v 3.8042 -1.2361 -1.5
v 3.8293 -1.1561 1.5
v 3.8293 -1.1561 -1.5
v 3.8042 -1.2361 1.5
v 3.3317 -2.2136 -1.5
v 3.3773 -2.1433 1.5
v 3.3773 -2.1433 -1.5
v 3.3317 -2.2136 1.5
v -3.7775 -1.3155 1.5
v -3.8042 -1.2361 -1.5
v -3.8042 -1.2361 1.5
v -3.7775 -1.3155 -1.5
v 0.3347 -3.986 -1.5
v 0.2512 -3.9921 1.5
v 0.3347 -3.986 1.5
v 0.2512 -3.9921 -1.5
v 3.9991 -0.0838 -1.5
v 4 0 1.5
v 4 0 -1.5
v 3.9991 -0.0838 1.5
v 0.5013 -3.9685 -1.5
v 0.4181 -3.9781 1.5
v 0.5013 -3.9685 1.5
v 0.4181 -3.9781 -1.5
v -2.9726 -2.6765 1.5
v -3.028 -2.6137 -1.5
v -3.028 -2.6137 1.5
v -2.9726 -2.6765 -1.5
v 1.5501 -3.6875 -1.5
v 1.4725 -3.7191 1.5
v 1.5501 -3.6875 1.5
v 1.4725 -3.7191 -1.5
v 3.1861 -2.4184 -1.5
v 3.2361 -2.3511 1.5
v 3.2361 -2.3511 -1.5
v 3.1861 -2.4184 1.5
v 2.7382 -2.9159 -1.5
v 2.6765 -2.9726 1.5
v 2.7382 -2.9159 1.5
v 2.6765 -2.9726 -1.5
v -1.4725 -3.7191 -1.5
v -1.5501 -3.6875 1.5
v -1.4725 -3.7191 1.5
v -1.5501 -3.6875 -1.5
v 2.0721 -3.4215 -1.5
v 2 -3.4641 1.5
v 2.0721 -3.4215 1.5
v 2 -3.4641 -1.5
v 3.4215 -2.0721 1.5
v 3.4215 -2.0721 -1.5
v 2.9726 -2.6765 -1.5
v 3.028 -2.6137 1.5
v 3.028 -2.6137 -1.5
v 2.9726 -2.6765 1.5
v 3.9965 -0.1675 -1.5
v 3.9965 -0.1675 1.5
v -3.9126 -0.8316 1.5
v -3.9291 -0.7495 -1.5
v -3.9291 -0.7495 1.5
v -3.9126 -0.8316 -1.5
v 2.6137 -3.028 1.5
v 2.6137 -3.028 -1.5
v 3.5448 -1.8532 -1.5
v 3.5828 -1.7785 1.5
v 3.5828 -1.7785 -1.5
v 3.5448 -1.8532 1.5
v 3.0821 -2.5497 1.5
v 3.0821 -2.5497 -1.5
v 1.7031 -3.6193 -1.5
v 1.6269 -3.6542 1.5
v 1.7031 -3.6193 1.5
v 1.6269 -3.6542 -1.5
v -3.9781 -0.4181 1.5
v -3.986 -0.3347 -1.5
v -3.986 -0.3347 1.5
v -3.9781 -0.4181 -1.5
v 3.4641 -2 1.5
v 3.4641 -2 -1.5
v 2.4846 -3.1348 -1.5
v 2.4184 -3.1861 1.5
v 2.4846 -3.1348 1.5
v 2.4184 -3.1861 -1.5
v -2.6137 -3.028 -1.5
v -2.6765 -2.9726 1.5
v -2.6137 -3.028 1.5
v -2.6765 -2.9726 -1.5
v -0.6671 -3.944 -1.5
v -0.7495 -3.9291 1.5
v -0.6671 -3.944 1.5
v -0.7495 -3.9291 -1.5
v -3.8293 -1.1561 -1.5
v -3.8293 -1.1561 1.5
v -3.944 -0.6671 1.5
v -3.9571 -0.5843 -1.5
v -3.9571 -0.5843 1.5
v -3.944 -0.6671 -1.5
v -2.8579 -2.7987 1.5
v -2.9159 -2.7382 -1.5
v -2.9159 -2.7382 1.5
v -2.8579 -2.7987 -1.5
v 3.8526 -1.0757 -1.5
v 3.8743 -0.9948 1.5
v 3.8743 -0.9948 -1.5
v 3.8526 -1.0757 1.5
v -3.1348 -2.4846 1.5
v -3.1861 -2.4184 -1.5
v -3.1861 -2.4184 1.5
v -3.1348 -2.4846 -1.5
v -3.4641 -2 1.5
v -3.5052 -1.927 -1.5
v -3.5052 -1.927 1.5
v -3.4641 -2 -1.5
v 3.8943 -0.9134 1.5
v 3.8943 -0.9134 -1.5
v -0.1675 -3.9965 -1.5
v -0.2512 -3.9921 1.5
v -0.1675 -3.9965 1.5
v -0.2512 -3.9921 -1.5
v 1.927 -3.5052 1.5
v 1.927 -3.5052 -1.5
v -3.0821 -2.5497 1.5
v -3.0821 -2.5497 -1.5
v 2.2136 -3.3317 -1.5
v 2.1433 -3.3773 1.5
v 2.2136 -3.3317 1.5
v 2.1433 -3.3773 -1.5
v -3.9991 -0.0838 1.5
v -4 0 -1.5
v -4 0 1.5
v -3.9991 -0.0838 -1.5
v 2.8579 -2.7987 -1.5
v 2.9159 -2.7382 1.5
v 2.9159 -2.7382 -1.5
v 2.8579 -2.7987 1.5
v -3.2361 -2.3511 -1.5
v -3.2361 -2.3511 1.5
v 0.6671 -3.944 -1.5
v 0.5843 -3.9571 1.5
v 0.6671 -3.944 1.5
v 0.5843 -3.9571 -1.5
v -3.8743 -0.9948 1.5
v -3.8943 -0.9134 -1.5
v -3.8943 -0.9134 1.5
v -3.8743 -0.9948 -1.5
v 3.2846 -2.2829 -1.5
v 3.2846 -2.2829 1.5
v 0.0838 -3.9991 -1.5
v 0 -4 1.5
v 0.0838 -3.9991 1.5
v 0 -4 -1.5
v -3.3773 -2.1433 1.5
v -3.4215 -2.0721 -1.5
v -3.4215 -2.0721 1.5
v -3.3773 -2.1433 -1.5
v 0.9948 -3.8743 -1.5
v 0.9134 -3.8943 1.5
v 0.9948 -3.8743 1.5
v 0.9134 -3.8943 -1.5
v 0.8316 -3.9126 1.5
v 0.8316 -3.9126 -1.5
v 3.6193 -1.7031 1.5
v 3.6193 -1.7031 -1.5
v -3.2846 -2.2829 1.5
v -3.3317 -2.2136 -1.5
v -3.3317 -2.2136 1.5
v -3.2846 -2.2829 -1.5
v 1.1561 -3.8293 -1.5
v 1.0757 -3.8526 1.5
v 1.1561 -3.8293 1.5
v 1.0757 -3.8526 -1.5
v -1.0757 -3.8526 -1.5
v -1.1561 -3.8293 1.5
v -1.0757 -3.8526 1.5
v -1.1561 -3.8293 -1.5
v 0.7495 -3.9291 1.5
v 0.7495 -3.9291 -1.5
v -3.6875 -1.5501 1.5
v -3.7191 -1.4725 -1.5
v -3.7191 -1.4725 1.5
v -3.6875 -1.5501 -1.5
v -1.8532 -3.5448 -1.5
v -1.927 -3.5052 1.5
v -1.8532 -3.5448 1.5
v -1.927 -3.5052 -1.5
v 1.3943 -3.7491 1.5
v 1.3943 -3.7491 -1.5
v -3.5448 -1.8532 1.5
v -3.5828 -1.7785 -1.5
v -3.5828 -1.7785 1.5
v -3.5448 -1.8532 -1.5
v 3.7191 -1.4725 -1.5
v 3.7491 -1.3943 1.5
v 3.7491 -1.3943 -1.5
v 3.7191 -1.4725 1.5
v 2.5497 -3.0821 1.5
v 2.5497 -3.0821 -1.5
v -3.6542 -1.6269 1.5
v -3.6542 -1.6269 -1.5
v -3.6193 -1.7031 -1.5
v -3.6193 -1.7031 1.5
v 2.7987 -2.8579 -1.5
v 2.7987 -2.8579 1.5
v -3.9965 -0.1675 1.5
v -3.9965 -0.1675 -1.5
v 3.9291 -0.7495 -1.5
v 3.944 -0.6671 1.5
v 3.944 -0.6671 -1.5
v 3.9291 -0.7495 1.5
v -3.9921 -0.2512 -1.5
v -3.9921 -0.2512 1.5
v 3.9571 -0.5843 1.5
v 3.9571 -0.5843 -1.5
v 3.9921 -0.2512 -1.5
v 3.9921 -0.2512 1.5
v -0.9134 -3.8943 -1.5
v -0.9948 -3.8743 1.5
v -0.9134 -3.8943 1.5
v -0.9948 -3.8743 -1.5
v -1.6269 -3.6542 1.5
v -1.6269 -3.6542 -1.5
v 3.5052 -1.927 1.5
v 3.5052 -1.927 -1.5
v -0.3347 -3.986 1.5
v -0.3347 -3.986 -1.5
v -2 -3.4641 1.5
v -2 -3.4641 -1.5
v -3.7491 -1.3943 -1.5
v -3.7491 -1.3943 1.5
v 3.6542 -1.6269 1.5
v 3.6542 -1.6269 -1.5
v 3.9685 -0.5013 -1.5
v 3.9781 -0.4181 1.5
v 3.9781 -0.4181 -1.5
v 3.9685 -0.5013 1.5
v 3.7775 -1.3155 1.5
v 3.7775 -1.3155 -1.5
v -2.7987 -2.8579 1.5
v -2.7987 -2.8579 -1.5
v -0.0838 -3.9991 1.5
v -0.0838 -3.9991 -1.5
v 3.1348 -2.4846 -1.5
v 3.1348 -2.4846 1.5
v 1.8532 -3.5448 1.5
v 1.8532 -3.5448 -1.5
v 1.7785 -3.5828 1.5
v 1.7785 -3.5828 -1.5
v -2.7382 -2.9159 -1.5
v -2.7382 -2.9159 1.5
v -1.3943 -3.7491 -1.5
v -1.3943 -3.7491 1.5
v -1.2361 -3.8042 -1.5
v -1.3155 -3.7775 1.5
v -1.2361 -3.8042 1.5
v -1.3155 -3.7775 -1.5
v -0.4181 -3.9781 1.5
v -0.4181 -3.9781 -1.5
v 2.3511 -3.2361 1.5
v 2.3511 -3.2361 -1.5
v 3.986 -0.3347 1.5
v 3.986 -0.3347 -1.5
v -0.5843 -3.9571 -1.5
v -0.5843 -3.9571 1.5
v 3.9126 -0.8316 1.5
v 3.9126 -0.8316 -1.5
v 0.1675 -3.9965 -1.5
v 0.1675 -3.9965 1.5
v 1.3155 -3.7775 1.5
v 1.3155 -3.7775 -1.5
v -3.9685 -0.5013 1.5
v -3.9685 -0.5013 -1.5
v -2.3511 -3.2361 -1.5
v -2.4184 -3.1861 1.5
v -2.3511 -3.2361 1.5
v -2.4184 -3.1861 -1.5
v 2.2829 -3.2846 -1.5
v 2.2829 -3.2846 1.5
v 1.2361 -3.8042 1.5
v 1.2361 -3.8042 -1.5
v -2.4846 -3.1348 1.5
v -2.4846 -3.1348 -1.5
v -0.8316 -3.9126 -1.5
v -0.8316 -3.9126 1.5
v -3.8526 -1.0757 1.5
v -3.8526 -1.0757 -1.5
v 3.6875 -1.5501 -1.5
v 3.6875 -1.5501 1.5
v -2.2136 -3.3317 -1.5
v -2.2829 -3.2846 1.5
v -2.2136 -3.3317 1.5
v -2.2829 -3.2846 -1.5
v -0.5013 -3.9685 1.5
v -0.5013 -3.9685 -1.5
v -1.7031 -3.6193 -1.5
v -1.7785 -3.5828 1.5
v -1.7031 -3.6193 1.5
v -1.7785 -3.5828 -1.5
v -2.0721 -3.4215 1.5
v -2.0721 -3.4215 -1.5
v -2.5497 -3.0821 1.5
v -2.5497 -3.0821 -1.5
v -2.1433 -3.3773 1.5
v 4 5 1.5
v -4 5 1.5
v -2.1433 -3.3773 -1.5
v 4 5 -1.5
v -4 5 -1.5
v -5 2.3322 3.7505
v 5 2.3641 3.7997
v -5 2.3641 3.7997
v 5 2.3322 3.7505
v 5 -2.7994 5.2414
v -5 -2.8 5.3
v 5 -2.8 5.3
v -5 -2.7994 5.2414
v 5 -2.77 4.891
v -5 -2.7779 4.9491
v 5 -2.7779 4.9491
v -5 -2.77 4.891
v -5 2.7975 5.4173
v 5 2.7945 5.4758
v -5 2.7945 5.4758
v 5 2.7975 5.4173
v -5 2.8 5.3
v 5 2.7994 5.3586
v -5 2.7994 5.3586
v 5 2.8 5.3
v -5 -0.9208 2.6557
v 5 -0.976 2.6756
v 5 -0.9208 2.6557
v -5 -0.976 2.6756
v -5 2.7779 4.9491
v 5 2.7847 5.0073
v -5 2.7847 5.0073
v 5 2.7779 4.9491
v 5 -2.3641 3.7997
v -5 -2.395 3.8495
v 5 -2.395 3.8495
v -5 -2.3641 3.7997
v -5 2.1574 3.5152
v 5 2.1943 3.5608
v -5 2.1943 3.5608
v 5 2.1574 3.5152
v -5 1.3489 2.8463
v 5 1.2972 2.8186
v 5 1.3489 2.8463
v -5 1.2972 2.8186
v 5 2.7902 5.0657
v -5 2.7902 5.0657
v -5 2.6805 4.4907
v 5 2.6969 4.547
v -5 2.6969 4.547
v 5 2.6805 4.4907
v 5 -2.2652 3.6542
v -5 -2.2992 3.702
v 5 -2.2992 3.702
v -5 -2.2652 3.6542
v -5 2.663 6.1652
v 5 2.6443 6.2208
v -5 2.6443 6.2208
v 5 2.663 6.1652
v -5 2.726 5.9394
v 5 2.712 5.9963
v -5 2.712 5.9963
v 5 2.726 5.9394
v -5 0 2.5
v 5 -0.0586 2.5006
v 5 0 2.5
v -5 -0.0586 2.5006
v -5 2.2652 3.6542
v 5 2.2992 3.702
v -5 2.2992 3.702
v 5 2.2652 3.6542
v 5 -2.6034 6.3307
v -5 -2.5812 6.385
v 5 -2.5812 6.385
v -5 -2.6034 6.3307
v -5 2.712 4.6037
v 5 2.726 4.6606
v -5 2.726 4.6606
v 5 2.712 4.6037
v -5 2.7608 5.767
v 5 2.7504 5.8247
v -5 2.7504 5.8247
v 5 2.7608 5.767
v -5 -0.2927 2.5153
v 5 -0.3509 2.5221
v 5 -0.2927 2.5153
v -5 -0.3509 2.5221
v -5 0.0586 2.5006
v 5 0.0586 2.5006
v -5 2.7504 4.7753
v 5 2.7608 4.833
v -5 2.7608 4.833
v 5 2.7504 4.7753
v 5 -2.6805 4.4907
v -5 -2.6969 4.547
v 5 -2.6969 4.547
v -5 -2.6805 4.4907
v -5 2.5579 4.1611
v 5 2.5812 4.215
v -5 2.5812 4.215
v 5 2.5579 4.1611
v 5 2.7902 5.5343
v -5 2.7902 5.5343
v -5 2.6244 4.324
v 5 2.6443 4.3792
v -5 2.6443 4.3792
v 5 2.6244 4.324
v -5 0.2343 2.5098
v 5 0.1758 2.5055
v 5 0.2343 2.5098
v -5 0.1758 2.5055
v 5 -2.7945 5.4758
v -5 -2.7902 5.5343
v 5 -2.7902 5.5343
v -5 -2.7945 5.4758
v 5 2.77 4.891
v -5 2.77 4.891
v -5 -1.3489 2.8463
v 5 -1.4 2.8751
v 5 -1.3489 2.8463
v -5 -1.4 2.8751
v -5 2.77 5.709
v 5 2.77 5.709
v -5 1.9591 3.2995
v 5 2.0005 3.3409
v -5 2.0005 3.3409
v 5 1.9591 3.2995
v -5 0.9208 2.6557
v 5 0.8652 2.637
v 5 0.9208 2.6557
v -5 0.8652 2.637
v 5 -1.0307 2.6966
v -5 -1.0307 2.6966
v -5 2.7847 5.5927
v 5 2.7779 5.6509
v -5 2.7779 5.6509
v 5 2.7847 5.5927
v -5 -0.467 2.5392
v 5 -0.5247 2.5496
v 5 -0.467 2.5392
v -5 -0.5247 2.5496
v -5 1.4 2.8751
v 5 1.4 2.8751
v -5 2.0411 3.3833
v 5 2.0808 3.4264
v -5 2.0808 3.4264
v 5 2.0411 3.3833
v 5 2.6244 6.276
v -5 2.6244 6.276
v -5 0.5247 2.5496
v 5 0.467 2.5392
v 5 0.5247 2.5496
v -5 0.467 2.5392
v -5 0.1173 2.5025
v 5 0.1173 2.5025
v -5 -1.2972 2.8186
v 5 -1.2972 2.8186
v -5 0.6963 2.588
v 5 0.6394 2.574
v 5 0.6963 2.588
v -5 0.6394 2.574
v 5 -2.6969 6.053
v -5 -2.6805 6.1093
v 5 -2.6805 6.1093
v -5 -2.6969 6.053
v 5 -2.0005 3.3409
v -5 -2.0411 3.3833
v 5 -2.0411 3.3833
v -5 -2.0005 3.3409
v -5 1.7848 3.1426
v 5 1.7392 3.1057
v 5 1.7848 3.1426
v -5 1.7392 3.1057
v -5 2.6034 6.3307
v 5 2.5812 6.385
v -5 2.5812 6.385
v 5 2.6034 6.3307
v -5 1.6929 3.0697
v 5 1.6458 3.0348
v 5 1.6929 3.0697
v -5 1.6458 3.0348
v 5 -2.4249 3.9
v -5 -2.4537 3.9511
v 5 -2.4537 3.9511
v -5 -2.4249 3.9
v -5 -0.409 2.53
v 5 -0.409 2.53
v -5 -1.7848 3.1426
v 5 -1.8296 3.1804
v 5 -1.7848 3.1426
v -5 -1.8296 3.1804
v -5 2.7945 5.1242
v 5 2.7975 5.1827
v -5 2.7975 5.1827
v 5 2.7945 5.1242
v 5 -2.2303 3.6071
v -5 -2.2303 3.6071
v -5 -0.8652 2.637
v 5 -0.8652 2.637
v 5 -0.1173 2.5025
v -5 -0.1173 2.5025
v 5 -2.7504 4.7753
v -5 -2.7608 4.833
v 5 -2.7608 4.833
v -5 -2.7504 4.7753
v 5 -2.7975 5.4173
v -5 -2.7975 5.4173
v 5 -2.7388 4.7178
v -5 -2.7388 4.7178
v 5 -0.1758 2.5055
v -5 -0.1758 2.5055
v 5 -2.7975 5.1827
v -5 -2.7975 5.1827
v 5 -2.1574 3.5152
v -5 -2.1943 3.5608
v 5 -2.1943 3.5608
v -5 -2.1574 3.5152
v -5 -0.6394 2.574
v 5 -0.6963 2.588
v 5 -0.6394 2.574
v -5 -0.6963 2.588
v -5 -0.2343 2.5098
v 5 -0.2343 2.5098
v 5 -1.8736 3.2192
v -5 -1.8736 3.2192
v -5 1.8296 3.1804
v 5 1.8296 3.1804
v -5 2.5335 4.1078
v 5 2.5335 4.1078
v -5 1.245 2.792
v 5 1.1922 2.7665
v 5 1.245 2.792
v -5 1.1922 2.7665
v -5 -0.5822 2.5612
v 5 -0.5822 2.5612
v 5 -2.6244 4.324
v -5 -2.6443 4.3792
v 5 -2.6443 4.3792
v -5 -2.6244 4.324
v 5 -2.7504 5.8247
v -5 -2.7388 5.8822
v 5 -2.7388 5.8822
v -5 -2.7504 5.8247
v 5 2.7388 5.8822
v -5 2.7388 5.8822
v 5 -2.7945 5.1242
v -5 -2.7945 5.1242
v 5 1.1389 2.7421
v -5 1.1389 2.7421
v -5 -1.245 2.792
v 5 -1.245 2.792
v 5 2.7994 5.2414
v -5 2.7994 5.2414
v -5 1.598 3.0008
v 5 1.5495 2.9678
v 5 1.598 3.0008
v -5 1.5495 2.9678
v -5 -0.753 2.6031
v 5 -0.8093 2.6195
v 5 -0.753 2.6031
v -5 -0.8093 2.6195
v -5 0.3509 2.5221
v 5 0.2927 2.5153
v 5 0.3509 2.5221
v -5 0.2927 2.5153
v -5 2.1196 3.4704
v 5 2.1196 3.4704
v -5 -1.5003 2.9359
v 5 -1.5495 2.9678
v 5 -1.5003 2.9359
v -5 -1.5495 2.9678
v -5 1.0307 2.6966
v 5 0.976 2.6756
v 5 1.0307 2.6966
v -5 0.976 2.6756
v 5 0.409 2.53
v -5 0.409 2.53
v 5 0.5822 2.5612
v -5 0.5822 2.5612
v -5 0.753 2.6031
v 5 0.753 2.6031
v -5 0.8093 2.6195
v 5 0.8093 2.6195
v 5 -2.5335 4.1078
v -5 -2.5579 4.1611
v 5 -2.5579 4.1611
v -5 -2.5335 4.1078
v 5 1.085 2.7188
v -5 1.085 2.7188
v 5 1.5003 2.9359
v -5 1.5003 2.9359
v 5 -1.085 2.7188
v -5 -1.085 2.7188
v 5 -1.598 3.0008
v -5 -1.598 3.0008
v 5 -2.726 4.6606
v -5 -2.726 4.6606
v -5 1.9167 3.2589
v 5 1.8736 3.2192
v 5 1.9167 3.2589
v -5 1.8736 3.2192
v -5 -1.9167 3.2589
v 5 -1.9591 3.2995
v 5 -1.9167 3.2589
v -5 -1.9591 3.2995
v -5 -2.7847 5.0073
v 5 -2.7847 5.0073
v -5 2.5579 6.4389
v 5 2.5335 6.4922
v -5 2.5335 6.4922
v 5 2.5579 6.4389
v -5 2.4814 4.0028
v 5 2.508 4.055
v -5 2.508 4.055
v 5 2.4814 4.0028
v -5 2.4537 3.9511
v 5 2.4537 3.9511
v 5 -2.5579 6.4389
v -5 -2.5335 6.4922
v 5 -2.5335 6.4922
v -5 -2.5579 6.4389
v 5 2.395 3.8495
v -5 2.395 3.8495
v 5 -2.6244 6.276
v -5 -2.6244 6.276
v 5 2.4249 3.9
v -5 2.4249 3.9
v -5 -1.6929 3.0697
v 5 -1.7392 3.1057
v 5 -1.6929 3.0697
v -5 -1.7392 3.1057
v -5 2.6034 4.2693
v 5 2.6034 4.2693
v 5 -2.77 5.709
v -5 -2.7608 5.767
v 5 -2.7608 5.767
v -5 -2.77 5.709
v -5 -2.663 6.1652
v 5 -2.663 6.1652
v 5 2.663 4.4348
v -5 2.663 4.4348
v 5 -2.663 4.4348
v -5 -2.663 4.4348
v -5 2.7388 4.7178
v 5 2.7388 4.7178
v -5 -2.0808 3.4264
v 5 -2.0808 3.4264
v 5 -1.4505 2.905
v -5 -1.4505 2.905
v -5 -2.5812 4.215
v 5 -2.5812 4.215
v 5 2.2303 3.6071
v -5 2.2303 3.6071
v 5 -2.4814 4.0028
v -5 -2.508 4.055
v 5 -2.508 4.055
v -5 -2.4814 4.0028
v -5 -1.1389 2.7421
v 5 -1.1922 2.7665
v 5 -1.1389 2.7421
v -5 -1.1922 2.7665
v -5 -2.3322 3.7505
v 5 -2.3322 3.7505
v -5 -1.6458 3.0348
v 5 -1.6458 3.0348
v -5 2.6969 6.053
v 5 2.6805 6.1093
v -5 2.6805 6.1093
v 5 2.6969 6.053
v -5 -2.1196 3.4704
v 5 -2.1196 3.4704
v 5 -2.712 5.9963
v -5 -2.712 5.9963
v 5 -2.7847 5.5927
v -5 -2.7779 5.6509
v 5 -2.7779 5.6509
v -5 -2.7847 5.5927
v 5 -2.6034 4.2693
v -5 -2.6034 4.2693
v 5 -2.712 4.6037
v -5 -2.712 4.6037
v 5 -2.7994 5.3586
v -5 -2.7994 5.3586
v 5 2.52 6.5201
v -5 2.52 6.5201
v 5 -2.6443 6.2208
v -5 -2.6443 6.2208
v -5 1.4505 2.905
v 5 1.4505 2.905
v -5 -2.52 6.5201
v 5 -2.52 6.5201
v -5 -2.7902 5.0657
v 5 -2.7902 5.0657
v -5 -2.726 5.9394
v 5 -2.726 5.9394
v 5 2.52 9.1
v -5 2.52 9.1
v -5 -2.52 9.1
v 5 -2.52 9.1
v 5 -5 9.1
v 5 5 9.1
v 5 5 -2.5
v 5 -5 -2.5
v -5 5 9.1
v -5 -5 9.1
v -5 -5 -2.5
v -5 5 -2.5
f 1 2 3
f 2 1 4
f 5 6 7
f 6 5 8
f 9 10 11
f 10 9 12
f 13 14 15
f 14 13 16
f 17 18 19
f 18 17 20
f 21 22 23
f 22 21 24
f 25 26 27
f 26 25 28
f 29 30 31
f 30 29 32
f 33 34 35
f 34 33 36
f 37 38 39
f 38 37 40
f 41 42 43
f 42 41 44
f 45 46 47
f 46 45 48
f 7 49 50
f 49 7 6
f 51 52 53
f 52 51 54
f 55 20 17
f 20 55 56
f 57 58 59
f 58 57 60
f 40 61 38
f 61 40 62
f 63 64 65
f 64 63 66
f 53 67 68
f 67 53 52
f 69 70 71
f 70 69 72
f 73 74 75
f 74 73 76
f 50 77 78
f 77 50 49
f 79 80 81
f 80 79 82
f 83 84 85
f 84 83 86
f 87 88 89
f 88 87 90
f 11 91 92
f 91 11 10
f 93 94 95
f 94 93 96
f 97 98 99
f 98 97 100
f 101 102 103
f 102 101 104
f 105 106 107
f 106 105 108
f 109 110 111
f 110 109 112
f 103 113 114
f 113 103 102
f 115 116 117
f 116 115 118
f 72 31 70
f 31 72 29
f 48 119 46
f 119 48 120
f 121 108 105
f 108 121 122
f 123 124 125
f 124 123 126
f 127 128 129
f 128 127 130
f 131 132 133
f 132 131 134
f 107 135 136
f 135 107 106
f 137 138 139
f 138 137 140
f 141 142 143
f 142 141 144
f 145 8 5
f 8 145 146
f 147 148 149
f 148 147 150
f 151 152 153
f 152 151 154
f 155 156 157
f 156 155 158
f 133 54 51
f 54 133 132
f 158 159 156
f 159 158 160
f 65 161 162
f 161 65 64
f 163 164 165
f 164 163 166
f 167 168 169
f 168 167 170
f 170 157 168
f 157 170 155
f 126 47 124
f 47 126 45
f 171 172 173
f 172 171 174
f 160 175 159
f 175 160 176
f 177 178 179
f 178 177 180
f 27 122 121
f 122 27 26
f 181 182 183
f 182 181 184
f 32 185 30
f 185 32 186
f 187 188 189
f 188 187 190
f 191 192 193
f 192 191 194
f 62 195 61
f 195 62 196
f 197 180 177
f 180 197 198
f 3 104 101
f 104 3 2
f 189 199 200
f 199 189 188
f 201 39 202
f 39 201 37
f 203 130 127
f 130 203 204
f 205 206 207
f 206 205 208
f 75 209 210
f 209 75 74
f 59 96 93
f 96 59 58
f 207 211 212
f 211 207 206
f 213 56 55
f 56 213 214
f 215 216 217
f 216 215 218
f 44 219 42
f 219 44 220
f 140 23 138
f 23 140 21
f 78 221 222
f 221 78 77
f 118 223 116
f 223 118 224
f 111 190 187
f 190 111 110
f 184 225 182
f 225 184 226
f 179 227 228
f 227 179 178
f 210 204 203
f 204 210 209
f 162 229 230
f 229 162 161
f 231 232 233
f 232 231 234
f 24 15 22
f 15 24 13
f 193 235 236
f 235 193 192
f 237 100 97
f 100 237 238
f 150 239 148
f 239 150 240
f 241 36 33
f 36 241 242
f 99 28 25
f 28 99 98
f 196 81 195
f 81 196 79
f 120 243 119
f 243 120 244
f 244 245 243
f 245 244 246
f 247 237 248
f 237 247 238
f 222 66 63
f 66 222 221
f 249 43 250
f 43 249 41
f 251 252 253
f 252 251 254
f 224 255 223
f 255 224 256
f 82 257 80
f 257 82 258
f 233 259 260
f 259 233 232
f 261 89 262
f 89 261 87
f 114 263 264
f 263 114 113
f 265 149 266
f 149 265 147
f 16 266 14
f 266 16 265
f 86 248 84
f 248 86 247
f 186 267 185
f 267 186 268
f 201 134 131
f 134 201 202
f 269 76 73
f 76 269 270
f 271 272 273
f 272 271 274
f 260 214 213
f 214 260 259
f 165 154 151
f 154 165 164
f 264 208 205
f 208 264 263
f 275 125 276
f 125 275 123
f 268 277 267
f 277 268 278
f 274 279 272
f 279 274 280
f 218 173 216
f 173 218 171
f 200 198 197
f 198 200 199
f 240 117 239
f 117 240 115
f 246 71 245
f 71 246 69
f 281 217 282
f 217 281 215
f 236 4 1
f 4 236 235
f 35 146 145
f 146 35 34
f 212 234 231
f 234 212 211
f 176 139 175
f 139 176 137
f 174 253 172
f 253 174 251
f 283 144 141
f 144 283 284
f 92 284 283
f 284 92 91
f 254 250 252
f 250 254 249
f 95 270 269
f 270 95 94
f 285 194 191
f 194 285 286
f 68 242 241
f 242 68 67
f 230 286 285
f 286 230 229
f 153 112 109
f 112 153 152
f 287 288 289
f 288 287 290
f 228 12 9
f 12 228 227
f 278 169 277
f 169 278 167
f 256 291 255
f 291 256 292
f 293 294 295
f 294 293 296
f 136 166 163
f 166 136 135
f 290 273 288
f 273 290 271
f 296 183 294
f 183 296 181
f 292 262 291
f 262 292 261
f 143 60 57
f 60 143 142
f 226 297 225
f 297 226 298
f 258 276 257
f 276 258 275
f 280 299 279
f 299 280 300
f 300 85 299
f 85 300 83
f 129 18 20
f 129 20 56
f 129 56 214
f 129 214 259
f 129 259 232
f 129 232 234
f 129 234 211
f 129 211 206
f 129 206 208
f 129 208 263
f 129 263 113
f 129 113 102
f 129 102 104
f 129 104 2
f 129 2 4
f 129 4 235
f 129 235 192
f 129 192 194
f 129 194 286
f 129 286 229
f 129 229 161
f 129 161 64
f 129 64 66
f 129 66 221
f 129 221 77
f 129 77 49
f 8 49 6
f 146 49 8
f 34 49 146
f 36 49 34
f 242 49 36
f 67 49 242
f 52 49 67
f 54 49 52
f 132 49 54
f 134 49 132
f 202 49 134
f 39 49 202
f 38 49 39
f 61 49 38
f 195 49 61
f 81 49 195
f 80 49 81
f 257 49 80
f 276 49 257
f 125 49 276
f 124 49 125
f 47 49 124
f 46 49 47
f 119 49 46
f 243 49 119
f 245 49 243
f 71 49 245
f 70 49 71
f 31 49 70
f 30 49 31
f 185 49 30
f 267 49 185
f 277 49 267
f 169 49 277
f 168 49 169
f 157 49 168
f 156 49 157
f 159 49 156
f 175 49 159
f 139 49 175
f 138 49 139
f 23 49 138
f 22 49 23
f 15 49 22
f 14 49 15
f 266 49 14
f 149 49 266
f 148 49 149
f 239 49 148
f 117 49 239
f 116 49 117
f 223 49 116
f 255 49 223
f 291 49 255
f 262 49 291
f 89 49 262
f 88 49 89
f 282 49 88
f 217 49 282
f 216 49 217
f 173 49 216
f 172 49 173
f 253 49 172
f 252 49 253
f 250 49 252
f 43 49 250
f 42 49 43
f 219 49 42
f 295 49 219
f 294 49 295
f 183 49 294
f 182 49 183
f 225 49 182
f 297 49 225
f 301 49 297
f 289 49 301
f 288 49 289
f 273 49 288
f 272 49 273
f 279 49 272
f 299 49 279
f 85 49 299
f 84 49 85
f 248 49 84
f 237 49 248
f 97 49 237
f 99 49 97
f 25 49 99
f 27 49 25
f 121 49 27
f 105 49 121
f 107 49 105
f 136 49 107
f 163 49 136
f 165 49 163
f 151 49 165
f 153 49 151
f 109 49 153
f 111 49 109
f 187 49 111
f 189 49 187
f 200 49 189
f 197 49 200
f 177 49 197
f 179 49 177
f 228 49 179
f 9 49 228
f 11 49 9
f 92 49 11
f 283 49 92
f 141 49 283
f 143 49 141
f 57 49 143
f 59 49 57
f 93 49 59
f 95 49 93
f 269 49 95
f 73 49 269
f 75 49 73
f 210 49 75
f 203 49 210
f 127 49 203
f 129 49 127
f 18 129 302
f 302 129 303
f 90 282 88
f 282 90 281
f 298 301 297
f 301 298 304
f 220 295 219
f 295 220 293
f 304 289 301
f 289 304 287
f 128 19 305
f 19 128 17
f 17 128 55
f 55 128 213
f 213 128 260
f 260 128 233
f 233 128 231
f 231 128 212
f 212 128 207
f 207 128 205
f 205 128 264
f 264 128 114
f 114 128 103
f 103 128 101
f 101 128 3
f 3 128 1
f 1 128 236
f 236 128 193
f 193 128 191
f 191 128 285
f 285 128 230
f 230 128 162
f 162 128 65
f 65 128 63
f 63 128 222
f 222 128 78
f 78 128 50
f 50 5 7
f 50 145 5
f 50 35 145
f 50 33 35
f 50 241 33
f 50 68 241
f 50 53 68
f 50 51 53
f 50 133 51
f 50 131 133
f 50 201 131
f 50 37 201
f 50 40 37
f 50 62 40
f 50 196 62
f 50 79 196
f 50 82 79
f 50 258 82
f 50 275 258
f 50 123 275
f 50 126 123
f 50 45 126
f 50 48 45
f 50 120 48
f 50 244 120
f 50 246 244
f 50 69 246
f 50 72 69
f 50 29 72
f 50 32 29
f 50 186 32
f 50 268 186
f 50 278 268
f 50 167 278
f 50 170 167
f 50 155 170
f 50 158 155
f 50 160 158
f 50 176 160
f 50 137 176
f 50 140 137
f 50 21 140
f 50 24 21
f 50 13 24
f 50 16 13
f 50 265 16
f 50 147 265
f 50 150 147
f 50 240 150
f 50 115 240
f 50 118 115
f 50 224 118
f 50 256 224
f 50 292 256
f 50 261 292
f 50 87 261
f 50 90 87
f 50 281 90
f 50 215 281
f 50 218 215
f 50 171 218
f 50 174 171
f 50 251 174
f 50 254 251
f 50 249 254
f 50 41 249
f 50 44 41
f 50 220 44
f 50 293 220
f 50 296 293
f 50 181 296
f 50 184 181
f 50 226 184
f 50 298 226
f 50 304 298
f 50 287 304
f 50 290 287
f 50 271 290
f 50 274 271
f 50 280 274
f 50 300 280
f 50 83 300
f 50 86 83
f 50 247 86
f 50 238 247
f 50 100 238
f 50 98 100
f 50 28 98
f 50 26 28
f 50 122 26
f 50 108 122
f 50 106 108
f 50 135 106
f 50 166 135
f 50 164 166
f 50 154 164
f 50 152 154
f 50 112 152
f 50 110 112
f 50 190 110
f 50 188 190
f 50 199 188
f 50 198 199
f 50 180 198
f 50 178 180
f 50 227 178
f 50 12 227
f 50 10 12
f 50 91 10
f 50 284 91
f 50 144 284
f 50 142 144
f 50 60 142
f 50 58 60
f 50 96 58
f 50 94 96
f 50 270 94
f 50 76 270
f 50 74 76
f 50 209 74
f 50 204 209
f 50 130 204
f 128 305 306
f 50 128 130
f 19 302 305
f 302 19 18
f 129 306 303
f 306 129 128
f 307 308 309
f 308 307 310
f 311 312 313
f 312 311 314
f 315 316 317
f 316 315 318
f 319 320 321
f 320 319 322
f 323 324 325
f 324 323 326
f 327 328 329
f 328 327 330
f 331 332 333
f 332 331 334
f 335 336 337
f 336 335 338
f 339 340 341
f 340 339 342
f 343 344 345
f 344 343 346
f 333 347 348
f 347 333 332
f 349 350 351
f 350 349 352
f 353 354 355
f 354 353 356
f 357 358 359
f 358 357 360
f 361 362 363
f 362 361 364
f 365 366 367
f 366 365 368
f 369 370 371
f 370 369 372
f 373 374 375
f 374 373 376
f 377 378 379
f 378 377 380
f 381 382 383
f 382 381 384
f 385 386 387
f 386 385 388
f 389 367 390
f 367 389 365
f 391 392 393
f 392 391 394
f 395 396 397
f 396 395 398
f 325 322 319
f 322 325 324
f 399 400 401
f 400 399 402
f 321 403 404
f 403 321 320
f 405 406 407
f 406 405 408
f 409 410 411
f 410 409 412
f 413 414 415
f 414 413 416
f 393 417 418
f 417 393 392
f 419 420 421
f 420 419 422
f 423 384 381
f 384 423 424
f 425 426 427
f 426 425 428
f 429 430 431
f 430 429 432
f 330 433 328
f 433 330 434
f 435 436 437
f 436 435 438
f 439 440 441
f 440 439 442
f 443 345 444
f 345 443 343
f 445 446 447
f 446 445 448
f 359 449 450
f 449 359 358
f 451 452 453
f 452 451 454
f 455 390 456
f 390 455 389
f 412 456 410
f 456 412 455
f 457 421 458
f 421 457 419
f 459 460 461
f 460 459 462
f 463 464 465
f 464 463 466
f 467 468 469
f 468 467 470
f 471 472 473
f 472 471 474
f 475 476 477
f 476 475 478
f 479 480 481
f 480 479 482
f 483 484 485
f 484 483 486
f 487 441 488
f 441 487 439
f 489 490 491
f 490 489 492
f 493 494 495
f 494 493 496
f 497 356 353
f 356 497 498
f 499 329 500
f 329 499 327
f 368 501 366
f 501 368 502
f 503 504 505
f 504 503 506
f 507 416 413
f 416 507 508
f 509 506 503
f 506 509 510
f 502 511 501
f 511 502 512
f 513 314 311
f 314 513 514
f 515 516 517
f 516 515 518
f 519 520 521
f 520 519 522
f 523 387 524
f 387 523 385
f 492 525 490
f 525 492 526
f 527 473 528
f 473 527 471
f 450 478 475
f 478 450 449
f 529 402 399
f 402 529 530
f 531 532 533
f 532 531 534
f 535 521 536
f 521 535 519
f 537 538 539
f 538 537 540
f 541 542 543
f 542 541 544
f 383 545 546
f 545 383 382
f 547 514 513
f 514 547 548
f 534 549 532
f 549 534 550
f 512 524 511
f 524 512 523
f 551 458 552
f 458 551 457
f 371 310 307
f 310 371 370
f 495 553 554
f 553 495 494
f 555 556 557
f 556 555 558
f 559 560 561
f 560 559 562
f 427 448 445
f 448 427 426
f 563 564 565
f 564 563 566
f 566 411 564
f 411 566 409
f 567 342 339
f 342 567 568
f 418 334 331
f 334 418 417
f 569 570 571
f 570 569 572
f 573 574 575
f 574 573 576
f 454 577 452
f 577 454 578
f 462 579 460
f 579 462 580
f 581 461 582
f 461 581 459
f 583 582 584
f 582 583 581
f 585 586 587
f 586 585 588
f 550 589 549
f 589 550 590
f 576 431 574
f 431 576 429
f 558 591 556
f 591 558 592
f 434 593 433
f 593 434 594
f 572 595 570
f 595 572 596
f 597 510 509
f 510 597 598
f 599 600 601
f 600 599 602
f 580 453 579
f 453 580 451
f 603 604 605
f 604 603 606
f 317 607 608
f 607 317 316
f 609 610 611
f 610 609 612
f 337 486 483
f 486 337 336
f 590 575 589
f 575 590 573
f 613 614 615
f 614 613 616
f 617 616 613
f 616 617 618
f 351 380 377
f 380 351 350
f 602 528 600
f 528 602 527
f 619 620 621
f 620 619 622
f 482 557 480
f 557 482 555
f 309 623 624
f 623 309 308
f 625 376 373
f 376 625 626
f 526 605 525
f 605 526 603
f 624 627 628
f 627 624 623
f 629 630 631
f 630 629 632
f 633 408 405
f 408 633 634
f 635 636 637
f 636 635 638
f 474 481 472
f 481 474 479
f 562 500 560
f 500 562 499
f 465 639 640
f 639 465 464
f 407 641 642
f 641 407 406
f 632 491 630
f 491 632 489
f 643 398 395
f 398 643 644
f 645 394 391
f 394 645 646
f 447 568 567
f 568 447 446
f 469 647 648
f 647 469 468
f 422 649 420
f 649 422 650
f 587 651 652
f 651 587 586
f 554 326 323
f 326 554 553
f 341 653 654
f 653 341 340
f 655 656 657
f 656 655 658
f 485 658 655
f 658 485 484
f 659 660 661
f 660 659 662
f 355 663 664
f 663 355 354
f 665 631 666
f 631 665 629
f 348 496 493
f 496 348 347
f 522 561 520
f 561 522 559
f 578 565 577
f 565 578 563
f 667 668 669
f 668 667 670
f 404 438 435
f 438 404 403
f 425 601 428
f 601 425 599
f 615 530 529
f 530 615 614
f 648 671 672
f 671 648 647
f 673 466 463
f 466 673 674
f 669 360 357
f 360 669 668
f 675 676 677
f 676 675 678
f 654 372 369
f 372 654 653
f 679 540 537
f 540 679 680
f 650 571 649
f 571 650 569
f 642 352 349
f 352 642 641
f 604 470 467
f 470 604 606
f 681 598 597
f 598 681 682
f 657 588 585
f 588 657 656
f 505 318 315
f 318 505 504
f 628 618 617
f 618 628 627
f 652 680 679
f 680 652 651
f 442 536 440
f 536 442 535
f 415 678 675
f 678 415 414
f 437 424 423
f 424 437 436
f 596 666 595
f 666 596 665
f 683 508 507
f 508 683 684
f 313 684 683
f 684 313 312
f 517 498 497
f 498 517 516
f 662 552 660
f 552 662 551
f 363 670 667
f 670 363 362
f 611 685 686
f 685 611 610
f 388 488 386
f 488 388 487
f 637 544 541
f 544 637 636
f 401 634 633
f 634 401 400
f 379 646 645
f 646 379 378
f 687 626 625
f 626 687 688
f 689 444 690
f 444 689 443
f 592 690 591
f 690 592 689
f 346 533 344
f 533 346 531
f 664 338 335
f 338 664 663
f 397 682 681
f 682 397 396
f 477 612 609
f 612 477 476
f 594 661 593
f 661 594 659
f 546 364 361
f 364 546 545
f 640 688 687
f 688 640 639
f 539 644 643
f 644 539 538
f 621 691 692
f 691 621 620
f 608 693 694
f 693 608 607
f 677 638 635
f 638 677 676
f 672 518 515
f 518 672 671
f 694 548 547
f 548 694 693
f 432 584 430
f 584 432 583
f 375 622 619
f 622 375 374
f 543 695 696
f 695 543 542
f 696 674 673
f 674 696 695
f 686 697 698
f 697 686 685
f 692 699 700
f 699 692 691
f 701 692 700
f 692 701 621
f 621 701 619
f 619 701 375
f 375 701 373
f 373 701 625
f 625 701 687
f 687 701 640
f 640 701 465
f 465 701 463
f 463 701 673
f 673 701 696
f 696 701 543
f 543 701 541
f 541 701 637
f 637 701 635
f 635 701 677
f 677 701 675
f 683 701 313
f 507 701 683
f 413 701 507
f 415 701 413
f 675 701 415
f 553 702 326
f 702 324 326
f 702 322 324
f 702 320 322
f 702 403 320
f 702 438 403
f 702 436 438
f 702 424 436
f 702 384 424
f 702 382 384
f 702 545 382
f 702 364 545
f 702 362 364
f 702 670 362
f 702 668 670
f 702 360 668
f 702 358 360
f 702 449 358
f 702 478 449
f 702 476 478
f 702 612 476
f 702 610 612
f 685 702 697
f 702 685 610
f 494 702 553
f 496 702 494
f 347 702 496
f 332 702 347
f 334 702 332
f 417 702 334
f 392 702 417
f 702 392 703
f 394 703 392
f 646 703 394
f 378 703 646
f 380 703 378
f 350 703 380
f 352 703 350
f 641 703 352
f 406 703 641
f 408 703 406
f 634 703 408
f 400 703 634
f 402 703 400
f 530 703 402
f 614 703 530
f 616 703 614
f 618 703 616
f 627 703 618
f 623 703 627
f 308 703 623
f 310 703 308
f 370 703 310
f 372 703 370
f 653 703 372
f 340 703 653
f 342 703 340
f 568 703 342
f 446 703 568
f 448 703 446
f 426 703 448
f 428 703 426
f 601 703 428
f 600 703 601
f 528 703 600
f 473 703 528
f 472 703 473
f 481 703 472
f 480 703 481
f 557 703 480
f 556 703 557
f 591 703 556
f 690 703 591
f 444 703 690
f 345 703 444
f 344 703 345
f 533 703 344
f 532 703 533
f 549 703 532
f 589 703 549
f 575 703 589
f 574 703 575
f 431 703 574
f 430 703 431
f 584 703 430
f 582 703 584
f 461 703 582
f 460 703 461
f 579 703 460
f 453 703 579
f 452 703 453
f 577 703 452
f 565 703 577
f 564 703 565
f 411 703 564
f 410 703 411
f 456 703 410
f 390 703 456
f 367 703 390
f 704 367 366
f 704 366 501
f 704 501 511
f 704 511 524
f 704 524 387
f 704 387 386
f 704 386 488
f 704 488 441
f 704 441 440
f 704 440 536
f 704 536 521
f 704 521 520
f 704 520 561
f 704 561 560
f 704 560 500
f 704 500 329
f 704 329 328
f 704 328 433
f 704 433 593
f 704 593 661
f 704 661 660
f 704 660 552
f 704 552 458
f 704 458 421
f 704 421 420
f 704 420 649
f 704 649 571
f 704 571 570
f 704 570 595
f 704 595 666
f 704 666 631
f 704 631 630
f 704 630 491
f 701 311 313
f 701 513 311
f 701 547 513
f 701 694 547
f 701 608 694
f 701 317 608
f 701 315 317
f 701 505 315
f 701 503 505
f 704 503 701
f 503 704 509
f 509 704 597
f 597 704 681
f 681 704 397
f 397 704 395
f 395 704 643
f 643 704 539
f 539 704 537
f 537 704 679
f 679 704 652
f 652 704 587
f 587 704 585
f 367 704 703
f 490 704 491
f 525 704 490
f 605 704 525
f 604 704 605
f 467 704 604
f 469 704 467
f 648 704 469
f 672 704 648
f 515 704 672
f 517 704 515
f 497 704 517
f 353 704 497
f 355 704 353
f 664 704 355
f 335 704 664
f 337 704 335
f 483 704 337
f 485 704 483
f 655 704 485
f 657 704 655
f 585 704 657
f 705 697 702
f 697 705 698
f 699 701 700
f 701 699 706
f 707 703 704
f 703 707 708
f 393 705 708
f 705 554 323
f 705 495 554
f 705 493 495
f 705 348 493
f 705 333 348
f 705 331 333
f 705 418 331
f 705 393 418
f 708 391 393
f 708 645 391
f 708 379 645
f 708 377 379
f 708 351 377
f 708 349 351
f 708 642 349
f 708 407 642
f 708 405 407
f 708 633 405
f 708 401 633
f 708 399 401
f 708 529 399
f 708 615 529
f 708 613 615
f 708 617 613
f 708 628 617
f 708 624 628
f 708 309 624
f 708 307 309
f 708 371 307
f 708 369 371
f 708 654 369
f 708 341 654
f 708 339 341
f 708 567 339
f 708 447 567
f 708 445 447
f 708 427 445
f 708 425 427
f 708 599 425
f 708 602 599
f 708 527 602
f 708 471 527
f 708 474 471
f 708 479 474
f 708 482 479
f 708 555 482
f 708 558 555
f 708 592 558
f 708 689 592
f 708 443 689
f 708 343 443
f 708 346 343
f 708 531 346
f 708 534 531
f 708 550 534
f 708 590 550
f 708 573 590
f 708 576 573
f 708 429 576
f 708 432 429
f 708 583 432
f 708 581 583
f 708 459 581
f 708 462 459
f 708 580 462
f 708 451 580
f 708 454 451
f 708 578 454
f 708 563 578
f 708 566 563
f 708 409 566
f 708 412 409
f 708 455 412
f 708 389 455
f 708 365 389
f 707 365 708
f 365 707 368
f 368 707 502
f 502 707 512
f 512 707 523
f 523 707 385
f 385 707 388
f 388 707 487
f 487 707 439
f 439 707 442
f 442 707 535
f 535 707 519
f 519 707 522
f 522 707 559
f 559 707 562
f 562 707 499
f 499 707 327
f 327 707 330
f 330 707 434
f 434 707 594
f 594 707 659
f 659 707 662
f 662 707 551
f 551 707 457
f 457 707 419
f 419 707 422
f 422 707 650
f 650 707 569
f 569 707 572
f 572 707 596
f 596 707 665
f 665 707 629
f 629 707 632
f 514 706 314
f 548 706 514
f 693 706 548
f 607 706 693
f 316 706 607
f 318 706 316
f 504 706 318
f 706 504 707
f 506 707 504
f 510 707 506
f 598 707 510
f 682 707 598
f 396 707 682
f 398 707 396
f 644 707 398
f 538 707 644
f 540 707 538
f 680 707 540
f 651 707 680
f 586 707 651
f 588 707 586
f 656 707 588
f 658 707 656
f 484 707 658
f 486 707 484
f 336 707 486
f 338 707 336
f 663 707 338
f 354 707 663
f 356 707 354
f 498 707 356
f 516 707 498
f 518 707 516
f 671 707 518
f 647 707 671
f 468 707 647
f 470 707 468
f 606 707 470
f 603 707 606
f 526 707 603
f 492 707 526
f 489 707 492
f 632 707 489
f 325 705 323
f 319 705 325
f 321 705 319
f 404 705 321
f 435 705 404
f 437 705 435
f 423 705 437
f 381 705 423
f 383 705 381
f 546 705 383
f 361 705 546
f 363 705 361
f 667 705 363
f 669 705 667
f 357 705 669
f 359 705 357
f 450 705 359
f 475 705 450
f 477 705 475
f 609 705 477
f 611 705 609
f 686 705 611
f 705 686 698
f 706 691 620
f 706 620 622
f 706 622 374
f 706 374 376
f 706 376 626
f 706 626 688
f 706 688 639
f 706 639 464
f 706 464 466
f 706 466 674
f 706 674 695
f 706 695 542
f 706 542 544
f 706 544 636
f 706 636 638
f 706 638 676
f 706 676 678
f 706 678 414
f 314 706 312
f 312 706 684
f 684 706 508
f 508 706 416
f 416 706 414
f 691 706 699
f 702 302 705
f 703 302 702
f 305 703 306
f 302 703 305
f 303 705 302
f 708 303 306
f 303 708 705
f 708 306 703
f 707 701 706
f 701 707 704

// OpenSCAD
// file: ../lib/extrude_directional.scad
/*
Copyright (C) Saeed Gholami Shahbandi. All rights reserved.
Author: Saeed Gholami Shahbandi (saeed.gh.sh@gmail.com)

This file is part of Arrangement Library.
The of Arrangement Library is free software: you can redistribute it and/or
modify it under the terms of the GNU Lesser General Public License as published
by the Free Software Foundation, either version 3 of the License,
or (at your option) any later version.

This program is distributed in the hope that it will be useful, but WITHOUT ANY
WARRANTY; without even the implied warranty of MERCHANTABILITY or FITNESS FOR A
PARTICULAR PURPOSE. See the GNU Lesser General Public License for more details.

You should have received a copy of the GNU Lesser General Public License along
with this program. If not, see <http://www.gnu.org/licenses/>
*/
tol = 0.01;

// Extrudes the shadow of the object projected at yz plan
module extrude_along_x(length=0)
{
    union(){
        // original object
        children();
        
        // extrusion of the object
        translate([max(0, length), 0, 0])
        rotate([0, -90, 0])
        linear_extrude(height=abs(length), center=false)
        projection()
        rotate([0, 90, 0])
        children();
    }    
}

// Extrudes the shadow of the object projected at zx plan
module extrude_along_y(length=0)
{
    union(){
        // original object
        children();
        
        // extrusion of the object
        rotate([-sign(length) * 90, 0, 0])
        linear_extrude(height=abs(length), center=false)
        projection()
        rotate([sign(length) * 90, 0, 0])
        children();
    }    
}

// Extrudes the shadow of the object projected at xy plan
module extrude_along_z(length=0)
{
    union(){
        // original object
        children();
        
        // extrusion of the object
        translate([0, 0, min(0, length)])
        linear_extrude(height=abs(length), center=false)
        projection()
        children();
    }    
}

// examples
module toy_example(size=5)
{
    union(){
        cube(2*size, true);

        translate([size, 0, 0])
        sphere(size);
        translate([-size, 0, 0])
        sphere(size);
        
        translate([0, size, 0])
        sphere(size);
        translate([0, -size, 0])
        sphere(size);
        
        translate([0, 0, size])
        sphere(size);
        translate([0, 0, -size])
        sphere(size);
    }
}


%extrude_along_x(length=20)
translate([0, 20, 0])
toy_example(size=5);

%extrude_along_y(length=20)
translate([0, 0, 20])
toy_example(size=5);

%extrude_along_z(length=20)
translate([20, 0, 0])
toy_example(size=5);
// main file
/*
Copyright (C) Saeed Gholami Shahbandi. All rights reserved.
Author: Saeed Gholami Shahbandi (saeed.gh.sh@gmail.com)

This file is part of Arrangement Library.
The of Arrangement Library is free software: you can redistribute it and/or
modify it under the terms of the GNU Lesser General Public License as published
by the Free Software Foundation, either version 3 of the License,
or (at your option) any later version.

This program is distributed in the hope that it will be useful, but WITHOUT ANY
WARRANTY; without even the implied warranty of MERCHANTABILITY or FITNESS FOR A
PARTICULAR PURPOSE. See the GNU Lesser General Public License for more details.

You should have received a copy of the GNU Lesser General Public License along
with this program. If not, see <http://www.gnu.org/licenses/>
*/

use <../lib/extrude_directional.scad>

tol = 0.02;
fragments = 300;

magnet_diameter = 8.0;
magnet_height = 3.0;
shaft_diameter = 5.6;
thickness = 1.0;

box_x = magnet_diameter + 2 * thickness;
box_y = box_x;
box_z = magnet_height + shaft_diameter + 3 * thickness;


module magnet()
{
    cylinder(h=magnet_height, d=magnet_diameter, $fn=fragments, center=true);
}


module shaft()
{
  color("Black", 1.0)
    translate([0, 0, shaft_diameter/2 + magnet_height/2 + thickness])
    rotate([0, 90, 0])
    cylinder(h=20, d=shaft_diameter, $fn=fragments, center=true);
}

module shaft_gap()
{
  color("Black", 1.0)
    translate([0, 0, shaft_diameter + magnet_height/2 + thickness])
    cube([20, shaft_diameter * 0.9, shaft_diameter], center=true);
}

difference(){
  color("Blue", 1.0)
    translate([0, 0, box_z/2 - (magnet_height/2 + thickness)])
    cube([box_x, box_y, box_z], center=true);

  
  union(){
    shaft();
    shaft_gap();
    
    extrude_along_y(length=1.1*box_x/2)
      magnet();
  }
}
